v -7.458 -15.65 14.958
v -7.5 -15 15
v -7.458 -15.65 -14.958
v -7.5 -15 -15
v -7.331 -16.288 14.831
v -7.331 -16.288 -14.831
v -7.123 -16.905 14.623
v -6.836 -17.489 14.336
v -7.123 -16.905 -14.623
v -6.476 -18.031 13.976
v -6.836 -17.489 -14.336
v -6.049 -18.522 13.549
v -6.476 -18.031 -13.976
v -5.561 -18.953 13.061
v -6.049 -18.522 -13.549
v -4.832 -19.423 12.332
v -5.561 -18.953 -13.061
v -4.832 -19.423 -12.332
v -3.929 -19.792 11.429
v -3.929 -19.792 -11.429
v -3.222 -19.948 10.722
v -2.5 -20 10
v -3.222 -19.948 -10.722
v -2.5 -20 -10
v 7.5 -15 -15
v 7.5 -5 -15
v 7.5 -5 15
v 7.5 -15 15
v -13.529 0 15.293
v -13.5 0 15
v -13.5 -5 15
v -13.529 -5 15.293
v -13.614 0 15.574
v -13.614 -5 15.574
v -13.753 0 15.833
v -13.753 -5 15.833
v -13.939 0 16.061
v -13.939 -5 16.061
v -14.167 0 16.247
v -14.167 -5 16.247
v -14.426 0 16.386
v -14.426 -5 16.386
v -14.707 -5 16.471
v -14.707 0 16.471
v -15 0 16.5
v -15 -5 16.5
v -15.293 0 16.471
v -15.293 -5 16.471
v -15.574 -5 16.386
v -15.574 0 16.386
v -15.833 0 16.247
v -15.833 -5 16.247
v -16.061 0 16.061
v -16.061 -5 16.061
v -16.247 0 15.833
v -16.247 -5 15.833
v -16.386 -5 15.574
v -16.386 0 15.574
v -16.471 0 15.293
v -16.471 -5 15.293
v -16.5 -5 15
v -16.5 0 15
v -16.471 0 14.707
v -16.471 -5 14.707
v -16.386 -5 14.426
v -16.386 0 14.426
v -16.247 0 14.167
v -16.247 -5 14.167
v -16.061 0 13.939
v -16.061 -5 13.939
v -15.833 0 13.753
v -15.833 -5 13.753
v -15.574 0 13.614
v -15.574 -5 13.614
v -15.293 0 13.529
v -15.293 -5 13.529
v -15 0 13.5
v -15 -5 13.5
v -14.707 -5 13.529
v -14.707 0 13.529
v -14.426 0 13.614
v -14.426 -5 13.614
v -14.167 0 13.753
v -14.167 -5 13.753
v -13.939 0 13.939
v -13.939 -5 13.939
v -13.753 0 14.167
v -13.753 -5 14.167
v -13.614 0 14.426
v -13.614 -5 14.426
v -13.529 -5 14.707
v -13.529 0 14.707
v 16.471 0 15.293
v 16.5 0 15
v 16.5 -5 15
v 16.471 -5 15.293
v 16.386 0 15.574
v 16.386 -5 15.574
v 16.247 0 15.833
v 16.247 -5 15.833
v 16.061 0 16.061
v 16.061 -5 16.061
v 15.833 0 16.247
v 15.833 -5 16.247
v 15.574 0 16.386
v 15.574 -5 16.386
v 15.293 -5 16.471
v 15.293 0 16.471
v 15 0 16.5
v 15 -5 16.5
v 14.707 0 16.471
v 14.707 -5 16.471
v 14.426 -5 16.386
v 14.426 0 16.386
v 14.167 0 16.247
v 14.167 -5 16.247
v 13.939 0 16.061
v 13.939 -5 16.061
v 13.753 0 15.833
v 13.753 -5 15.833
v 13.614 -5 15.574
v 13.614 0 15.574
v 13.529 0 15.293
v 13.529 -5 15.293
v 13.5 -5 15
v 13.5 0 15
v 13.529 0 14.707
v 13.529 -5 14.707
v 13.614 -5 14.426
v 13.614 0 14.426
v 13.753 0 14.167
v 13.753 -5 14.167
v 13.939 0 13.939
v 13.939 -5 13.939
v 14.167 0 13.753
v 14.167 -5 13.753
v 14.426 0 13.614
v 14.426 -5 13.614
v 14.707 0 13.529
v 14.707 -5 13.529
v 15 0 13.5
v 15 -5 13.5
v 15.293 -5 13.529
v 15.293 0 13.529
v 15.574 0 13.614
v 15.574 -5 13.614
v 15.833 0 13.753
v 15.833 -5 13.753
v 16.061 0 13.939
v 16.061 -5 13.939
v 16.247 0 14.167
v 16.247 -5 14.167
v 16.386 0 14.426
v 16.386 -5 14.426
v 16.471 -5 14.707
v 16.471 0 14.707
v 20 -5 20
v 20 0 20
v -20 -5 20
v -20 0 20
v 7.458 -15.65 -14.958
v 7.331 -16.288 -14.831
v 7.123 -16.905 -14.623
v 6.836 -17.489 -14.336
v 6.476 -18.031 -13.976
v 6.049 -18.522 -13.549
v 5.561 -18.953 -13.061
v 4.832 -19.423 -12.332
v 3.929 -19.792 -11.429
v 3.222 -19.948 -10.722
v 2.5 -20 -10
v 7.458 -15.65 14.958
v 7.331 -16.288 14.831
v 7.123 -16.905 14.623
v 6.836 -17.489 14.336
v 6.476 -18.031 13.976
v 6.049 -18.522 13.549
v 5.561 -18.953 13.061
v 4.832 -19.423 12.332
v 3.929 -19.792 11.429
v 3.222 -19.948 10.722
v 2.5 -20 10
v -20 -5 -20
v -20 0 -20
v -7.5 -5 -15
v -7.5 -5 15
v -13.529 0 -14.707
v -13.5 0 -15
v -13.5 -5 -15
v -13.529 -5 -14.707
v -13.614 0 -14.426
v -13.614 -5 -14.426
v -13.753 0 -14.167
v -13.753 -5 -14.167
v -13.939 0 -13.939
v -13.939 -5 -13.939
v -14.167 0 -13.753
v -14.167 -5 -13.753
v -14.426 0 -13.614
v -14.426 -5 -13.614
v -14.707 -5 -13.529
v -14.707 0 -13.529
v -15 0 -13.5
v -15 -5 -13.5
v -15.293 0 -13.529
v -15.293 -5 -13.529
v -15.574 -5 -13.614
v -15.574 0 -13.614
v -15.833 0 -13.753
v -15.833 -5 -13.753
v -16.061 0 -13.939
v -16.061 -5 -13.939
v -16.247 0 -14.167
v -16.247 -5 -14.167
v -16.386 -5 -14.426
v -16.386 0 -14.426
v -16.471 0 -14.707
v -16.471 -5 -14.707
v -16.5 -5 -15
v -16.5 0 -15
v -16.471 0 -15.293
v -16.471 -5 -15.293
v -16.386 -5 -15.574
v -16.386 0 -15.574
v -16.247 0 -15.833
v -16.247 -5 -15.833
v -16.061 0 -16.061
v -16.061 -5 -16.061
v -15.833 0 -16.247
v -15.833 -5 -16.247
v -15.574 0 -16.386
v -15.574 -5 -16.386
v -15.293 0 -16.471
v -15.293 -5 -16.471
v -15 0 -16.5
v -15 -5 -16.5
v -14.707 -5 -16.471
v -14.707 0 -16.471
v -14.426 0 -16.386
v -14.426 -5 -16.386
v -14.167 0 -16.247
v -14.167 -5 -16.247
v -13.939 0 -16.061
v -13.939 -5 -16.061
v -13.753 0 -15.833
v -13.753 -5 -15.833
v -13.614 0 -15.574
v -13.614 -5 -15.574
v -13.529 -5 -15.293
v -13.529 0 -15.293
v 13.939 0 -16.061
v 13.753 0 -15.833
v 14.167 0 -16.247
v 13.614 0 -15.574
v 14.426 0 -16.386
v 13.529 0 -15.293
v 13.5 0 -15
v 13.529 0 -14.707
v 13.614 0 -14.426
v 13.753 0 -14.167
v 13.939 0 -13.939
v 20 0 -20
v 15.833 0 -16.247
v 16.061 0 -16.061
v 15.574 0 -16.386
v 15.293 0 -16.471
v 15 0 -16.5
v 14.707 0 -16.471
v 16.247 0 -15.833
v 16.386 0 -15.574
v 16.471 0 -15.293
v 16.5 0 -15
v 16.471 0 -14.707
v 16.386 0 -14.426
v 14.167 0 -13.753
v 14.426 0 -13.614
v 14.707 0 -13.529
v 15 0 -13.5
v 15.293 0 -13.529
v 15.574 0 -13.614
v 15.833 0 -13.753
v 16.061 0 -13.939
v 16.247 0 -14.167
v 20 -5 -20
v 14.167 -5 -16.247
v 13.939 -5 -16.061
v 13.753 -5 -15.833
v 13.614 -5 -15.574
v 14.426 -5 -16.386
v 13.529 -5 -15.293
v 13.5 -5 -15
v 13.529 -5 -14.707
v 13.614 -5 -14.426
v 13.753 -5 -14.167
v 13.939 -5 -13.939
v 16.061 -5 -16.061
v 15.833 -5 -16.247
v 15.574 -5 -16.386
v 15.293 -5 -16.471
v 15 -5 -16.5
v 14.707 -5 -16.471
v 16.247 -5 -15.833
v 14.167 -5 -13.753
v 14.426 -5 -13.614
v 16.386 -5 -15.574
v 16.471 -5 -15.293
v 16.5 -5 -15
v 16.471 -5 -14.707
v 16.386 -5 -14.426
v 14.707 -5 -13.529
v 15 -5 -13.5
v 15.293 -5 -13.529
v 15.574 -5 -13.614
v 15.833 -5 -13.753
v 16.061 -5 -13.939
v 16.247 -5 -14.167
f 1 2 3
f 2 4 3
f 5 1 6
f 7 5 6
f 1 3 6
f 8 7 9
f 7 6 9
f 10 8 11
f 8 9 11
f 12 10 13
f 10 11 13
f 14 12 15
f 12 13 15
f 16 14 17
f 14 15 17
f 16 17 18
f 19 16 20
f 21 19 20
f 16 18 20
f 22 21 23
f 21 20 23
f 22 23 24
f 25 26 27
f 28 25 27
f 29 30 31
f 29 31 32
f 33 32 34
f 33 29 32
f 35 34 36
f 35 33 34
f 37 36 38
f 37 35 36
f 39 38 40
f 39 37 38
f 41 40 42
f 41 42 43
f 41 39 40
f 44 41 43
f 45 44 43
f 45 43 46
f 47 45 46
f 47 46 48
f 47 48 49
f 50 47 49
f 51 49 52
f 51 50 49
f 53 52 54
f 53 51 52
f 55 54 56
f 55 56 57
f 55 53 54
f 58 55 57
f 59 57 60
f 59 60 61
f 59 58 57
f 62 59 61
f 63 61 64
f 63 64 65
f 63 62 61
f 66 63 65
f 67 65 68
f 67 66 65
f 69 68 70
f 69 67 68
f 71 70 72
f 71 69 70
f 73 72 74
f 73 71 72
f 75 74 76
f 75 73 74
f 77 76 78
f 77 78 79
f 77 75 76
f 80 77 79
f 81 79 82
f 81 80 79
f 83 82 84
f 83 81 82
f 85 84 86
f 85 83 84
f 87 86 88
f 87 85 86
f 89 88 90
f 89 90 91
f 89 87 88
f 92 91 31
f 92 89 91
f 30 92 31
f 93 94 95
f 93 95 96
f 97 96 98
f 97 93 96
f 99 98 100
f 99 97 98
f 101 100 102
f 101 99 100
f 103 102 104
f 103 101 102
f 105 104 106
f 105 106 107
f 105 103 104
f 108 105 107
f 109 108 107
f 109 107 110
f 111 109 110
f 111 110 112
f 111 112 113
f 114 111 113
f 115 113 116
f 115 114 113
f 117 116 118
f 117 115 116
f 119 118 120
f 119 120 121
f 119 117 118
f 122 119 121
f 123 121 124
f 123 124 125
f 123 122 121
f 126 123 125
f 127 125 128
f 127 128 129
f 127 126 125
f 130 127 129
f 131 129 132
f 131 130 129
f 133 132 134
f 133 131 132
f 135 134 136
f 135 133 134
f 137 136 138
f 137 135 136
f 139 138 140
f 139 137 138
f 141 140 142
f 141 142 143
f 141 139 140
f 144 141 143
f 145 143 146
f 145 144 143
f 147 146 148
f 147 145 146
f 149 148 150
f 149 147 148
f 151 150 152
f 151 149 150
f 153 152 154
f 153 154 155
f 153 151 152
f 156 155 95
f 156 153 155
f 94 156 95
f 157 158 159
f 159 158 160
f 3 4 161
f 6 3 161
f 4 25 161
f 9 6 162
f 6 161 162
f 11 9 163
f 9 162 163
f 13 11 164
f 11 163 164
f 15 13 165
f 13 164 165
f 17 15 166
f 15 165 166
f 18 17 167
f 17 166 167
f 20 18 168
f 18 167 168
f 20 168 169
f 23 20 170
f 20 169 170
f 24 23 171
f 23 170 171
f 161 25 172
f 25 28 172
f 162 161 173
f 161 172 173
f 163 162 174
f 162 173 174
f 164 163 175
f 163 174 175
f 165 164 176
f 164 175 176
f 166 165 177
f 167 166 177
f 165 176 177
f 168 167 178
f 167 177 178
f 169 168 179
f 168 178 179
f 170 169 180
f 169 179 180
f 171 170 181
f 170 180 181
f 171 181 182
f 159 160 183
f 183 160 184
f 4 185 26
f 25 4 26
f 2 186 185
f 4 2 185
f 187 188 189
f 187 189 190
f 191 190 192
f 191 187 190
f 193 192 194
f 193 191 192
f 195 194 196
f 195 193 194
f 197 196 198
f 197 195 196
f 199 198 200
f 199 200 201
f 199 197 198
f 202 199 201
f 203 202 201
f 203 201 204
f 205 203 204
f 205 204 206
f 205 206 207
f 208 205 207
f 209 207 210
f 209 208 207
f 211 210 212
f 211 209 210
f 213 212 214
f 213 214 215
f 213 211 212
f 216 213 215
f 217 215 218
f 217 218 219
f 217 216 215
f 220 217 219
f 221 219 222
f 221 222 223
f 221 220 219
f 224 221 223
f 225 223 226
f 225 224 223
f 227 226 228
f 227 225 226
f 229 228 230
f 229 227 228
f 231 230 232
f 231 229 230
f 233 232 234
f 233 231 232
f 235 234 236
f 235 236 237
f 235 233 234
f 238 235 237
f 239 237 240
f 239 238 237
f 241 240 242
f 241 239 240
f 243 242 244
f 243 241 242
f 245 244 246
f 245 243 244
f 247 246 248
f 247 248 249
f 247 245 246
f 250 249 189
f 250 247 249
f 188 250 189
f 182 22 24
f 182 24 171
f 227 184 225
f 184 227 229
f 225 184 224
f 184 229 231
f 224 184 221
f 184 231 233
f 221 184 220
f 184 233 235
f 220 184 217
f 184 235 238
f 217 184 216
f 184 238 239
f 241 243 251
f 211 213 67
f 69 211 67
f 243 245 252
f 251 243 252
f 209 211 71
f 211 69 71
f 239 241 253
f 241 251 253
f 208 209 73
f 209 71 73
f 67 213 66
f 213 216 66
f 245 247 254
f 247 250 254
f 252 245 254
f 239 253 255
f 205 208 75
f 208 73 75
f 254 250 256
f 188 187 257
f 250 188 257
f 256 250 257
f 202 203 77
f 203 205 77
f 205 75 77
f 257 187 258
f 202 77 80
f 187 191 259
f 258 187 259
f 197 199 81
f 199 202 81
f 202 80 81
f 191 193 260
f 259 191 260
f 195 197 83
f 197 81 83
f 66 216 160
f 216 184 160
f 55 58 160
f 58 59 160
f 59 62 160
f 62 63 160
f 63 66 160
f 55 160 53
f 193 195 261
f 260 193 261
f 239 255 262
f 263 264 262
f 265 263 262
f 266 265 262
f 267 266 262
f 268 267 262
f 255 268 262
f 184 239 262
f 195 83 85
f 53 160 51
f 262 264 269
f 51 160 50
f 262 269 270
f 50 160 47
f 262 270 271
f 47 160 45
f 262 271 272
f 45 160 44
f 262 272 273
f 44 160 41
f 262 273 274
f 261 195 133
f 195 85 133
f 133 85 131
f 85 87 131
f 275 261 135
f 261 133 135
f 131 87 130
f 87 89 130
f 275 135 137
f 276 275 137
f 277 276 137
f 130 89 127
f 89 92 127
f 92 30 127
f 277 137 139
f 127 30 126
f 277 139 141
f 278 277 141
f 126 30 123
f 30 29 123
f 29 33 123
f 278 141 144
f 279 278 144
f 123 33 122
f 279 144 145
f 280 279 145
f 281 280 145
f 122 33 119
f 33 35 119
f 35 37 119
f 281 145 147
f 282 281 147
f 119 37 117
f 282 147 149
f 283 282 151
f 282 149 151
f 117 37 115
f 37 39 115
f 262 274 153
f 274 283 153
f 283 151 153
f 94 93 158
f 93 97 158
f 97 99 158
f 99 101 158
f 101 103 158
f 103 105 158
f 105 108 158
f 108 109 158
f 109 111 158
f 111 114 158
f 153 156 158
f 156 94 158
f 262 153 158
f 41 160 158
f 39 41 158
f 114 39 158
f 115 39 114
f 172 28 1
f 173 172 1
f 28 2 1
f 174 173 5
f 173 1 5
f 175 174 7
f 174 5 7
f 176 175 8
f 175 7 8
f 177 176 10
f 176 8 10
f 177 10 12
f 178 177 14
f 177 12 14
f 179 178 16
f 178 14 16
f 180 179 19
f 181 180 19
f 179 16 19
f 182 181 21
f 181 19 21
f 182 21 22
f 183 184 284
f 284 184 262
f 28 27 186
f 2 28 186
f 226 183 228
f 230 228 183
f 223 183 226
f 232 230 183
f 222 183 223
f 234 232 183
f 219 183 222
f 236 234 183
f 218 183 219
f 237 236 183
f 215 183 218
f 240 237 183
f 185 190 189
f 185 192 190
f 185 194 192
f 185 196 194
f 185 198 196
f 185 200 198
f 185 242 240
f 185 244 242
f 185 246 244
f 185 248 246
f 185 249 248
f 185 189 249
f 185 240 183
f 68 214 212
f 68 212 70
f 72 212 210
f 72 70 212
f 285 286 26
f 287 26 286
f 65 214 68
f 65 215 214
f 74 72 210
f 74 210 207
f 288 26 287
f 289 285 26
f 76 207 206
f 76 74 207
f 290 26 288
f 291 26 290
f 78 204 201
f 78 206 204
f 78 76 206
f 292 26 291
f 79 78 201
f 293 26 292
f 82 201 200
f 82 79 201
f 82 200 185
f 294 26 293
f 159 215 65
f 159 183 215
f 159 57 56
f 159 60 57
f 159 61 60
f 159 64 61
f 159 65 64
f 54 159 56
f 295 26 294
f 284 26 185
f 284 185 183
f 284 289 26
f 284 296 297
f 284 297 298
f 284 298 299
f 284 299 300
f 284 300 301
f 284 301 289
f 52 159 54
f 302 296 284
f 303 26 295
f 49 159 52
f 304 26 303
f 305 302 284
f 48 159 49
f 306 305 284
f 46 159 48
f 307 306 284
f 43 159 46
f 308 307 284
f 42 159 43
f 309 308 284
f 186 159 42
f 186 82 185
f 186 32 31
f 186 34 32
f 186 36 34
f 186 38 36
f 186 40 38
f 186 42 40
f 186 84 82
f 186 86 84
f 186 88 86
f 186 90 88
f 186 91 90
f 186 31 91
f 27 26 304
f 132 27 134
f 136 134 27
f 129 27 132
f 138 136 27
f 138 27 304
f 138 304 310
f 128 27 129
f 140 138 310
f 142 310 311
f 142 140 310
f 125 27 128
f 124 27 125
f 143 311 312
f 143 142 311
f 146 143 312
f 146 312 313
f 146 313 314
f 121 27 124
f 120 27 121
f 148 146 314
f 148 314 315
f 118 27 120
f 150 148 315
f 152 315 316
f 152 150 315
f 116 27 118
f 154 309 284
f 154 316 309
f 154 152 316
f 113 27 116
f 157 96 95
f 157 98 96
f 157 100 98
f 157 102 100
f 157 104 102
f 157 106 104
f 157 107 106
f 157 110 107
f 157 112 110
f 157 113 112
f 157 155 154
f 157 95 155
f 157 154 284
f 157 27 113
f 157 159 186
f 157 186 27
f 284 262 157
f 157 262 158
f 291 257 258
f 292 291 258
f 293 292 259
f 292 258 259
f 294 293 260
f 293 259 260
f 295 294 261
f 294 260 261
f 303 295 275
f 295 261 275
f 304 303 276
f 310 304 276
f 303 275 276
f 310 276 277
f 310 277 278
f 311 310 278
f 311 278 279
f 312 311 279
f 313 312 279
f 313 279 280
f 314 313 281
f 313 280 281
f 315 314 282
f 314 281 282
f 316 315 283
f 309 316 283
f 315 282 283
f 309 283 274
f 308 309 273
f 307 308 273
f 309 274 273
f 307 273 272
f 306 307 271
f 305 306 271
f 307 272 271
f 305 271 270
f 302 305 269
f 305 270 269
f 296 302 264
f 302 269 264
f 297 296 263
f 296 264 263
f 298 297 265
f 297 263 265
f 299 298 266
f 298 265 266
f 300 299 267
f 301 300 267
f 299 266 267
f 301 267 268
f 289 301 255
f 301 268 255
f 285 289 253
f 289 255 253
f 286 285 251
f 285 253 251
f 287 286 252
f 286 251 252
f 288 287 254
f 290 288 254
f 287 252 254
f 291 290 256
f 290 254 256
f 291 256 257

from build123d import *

# Parameters (mm, degrees)
F0_R     = 1.5
F1_DEPTH = 5
F3_DEPTH = 15
F4_R     = 5


with BuildPart() as f1:
    # F0 (on Front) → F1 (new body)
    with BuildSketch(Plane.XZ):
        with Locations((-15, -15)):
            Circle(F0_R)
        with BuildLine():
            ThreePointArc((16.5, -15), (15, -13.5), (13.5, -15))
            ThreePointArc((13.5, -15), (15, -16.5), (16.5, -15))
        make_face()
        Polygon((-20, 20), (-20, 0), (-20, -20), (20, -20), (20, 20), align=None)
        with Locations((-15, -15)):
            Circle(F0_R, mode=Mode.SUBTRACT)
        with BuildLine():
            ThreePointArc((16.5, -15), (15, -16.5), (13.5, -15))
            ThreePointArc((13.5, -15), (15, -13.5), (16.5, -15))
        make_face(mode=Mode.SUBTRACT)
        with Locations((-15, 15)):
            Circle(F0_R, mode=Mode.SUBTRACT)
        with Locations((15, 15)):
            Circle(F0_R, mode=Mode.SUBTRACT)
    extrude(amount=F1_DEPTH)

    # F2 (on face) → F3 (join)
    with BuildSketch(Plane.XZ.offset(5)):
        Polygon((7.5, 15), (0, 15), (-7.5, 15), (-7.5, -15), (7.5, -15), align=None)
    extrude(amount=F3_DEPTH)

    # F4
    f4_edges = [f1.edges().sort_by_distance(p)[0] for p in [
        (-7.5, -20, 0),
        (0, -20, 15),
        (7.5, -20, 0),
        (0, -20, -15),
    ]]
    fillet(f4_edges, radius=F4_R)


solid = f1.part
